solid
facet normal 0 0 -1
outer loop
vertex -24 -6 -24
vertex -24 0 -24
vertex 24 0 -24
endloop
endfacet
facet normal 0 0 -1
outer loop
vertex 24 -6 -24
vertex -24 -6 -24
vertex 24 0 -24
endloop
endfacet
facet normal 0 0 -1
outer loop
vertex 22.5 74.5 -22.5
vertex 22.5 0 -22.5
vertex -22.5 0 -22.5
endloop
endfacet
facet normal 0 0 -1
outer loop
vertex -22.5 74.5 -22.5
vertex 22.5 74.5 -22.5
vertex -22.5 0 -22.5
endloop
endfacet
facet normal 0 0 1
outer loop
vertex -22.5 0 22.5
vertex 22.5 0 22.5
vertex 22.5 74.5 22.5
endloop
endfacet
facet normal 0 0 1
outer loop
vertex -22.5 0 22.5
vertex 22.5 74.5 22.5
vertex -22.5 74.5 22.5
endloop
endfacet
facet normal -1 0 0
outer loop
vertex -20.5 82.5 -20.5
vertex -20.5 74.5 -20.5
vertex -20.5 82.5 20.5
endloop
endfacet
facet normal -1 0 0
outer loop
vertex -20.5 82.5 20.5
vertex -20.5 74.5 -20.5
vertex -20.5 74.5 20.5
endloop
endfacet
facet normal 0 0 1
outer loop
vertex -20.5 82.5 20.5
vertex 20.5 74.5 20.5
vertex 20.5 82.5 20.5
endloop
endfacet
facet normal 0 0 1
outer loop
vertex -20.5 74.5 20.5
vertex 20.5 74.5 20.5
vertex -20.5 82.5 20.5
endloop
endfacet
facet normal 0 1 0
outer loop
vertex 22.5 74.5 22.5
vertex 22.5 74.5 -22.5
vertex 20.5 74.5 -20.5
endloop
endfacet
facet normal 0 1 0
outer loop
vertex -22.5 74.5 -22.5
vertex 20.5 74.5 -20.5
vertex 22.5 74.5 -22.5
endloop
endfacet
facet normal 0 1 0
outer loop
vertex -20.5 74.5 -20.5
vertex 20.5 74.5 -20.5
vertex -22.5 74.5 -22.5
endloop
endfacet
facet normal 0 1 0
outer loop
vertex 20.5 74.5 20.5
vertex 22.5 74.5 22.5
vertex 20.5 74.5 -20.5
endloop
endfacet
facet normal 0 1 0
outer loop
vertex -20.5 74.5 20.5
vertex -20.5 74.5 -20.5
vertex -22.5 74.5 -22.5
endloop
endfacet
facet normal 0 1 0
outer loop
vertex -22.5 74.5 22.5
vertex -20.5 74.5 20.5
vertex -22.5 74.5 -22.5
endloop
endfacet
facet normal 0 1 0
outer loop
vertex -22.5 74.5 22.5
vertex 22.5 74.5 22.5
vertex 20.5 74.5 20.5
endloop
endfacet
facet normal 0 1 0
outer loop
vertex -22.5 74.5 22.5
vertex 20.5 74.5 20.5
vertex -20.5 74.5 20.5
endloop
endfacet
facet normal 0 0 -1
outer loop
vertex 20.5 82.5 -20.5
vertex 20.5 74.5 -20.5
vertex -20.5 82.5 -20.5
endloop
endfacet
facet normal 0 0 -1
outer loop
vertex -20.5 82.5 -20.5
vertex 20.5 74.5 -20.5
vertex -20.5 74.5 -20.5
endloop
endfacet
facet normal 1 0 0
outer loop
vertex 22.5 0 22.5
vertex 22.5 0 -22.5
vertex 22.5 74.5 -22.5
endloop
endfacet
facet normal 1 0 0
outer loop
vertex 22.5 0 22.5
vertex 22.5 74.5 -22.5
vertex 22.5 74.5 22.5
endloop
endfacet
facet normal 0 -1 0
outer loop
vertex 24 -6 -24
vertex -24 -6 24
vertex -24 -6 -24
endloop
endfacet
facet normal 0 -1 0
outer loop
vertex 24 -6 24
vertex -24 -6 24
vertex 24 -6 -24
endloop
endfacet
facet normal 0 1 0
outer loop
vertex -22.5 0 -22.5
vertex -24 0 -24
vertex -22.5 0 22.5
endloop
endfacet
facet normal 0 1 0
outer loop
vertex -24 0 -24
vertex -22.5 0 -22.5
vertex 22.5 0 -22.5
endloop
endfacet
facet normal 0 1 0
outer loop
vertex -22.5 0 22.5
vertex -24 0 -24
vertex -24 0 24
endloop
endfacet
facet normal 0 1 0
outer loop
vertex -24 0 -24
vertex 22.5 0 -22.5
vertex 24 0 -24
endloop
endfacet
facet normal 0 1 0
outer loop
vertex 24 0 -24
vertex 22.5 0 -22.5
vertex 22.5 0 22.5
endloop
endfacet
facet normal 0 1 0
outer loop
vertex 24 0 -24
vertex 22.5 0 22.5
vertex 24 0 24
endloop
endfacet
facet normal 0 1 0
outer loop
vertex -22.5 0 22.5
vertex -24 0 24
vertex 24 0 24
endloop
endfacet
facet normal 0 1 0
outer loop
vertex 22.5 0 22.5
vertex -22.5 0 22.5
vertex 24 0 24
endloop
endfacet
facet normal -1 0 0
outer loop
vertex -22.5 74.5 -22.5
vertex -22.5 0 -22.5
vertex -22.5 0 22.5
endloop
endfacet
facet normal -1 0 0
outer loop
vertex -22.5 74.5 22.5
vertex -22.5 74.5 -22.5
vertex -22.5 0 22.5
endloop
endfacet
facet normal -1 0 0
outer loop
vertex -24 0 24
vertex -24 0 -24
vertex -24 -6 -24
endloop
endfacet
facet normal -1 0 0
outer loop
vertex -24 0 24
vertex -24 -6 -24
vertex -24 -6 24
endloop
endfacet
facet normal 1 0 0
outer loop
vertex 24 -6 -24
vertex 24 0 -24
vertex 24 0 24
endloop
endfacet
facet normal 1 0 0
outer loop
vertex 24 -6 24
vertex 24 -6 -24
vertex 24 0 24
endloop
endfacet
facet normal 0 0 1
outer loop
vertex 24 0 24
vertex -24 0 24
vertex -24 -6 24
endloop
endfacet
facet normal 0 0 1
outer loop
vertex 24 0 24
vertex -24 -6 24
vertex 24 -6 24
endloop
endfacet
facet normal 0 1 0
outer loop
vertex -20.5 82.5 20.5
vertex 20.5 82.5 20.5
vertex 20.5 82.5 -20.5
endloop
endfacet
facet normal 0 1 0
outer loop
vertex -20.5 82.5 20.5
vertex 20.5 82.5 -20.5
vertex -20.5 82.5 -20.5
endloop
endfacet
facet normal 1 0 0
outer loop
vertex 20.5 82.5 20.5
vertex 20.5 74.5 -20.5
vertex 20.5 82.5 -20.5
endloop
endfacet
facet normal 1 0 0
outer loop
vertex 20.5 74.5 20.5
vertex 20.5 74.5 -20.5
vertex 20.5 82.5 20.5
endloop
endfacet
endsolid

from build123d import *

# Parameters (mm, degrees)
F0_W     = 48
F0_H     = 48
F1_DEPTH = 6
F2_W     = 45
F2_H     = 45
F3_DEPTH = 74.5
F4_W     = 41
F4_H     = 41
F5_DEPTH = 8


with BuildPart() as f1:
    # F0 (on Front) → F1 (new body)
    with BuildSketch(Plane.XZ):
        Rectangle(F0_W, F0_H)
    extrude(amount=F1_DEPTH)

    # F2 (on face) → F3 (join)
    with BuildSketch(Plane(origin=(0, 0, 0), x_dir=(-1, 0, 0), z_dir=(0, 1, 0))):
        Rectangle(F2_W, F2_H)
    extrude(amount=F3_DEPTH)

    # F4 (on face) → F5 (join)
    with BuildSketch(Plane(origin=(0, 74.5, 0), x_dir=(-1, 0, 0), z_dir=(0, 1, 0))):
        Rectangle(F4_W, F4_H)
    extrude(amount=F5_DEPTH)


solid = f1.part
